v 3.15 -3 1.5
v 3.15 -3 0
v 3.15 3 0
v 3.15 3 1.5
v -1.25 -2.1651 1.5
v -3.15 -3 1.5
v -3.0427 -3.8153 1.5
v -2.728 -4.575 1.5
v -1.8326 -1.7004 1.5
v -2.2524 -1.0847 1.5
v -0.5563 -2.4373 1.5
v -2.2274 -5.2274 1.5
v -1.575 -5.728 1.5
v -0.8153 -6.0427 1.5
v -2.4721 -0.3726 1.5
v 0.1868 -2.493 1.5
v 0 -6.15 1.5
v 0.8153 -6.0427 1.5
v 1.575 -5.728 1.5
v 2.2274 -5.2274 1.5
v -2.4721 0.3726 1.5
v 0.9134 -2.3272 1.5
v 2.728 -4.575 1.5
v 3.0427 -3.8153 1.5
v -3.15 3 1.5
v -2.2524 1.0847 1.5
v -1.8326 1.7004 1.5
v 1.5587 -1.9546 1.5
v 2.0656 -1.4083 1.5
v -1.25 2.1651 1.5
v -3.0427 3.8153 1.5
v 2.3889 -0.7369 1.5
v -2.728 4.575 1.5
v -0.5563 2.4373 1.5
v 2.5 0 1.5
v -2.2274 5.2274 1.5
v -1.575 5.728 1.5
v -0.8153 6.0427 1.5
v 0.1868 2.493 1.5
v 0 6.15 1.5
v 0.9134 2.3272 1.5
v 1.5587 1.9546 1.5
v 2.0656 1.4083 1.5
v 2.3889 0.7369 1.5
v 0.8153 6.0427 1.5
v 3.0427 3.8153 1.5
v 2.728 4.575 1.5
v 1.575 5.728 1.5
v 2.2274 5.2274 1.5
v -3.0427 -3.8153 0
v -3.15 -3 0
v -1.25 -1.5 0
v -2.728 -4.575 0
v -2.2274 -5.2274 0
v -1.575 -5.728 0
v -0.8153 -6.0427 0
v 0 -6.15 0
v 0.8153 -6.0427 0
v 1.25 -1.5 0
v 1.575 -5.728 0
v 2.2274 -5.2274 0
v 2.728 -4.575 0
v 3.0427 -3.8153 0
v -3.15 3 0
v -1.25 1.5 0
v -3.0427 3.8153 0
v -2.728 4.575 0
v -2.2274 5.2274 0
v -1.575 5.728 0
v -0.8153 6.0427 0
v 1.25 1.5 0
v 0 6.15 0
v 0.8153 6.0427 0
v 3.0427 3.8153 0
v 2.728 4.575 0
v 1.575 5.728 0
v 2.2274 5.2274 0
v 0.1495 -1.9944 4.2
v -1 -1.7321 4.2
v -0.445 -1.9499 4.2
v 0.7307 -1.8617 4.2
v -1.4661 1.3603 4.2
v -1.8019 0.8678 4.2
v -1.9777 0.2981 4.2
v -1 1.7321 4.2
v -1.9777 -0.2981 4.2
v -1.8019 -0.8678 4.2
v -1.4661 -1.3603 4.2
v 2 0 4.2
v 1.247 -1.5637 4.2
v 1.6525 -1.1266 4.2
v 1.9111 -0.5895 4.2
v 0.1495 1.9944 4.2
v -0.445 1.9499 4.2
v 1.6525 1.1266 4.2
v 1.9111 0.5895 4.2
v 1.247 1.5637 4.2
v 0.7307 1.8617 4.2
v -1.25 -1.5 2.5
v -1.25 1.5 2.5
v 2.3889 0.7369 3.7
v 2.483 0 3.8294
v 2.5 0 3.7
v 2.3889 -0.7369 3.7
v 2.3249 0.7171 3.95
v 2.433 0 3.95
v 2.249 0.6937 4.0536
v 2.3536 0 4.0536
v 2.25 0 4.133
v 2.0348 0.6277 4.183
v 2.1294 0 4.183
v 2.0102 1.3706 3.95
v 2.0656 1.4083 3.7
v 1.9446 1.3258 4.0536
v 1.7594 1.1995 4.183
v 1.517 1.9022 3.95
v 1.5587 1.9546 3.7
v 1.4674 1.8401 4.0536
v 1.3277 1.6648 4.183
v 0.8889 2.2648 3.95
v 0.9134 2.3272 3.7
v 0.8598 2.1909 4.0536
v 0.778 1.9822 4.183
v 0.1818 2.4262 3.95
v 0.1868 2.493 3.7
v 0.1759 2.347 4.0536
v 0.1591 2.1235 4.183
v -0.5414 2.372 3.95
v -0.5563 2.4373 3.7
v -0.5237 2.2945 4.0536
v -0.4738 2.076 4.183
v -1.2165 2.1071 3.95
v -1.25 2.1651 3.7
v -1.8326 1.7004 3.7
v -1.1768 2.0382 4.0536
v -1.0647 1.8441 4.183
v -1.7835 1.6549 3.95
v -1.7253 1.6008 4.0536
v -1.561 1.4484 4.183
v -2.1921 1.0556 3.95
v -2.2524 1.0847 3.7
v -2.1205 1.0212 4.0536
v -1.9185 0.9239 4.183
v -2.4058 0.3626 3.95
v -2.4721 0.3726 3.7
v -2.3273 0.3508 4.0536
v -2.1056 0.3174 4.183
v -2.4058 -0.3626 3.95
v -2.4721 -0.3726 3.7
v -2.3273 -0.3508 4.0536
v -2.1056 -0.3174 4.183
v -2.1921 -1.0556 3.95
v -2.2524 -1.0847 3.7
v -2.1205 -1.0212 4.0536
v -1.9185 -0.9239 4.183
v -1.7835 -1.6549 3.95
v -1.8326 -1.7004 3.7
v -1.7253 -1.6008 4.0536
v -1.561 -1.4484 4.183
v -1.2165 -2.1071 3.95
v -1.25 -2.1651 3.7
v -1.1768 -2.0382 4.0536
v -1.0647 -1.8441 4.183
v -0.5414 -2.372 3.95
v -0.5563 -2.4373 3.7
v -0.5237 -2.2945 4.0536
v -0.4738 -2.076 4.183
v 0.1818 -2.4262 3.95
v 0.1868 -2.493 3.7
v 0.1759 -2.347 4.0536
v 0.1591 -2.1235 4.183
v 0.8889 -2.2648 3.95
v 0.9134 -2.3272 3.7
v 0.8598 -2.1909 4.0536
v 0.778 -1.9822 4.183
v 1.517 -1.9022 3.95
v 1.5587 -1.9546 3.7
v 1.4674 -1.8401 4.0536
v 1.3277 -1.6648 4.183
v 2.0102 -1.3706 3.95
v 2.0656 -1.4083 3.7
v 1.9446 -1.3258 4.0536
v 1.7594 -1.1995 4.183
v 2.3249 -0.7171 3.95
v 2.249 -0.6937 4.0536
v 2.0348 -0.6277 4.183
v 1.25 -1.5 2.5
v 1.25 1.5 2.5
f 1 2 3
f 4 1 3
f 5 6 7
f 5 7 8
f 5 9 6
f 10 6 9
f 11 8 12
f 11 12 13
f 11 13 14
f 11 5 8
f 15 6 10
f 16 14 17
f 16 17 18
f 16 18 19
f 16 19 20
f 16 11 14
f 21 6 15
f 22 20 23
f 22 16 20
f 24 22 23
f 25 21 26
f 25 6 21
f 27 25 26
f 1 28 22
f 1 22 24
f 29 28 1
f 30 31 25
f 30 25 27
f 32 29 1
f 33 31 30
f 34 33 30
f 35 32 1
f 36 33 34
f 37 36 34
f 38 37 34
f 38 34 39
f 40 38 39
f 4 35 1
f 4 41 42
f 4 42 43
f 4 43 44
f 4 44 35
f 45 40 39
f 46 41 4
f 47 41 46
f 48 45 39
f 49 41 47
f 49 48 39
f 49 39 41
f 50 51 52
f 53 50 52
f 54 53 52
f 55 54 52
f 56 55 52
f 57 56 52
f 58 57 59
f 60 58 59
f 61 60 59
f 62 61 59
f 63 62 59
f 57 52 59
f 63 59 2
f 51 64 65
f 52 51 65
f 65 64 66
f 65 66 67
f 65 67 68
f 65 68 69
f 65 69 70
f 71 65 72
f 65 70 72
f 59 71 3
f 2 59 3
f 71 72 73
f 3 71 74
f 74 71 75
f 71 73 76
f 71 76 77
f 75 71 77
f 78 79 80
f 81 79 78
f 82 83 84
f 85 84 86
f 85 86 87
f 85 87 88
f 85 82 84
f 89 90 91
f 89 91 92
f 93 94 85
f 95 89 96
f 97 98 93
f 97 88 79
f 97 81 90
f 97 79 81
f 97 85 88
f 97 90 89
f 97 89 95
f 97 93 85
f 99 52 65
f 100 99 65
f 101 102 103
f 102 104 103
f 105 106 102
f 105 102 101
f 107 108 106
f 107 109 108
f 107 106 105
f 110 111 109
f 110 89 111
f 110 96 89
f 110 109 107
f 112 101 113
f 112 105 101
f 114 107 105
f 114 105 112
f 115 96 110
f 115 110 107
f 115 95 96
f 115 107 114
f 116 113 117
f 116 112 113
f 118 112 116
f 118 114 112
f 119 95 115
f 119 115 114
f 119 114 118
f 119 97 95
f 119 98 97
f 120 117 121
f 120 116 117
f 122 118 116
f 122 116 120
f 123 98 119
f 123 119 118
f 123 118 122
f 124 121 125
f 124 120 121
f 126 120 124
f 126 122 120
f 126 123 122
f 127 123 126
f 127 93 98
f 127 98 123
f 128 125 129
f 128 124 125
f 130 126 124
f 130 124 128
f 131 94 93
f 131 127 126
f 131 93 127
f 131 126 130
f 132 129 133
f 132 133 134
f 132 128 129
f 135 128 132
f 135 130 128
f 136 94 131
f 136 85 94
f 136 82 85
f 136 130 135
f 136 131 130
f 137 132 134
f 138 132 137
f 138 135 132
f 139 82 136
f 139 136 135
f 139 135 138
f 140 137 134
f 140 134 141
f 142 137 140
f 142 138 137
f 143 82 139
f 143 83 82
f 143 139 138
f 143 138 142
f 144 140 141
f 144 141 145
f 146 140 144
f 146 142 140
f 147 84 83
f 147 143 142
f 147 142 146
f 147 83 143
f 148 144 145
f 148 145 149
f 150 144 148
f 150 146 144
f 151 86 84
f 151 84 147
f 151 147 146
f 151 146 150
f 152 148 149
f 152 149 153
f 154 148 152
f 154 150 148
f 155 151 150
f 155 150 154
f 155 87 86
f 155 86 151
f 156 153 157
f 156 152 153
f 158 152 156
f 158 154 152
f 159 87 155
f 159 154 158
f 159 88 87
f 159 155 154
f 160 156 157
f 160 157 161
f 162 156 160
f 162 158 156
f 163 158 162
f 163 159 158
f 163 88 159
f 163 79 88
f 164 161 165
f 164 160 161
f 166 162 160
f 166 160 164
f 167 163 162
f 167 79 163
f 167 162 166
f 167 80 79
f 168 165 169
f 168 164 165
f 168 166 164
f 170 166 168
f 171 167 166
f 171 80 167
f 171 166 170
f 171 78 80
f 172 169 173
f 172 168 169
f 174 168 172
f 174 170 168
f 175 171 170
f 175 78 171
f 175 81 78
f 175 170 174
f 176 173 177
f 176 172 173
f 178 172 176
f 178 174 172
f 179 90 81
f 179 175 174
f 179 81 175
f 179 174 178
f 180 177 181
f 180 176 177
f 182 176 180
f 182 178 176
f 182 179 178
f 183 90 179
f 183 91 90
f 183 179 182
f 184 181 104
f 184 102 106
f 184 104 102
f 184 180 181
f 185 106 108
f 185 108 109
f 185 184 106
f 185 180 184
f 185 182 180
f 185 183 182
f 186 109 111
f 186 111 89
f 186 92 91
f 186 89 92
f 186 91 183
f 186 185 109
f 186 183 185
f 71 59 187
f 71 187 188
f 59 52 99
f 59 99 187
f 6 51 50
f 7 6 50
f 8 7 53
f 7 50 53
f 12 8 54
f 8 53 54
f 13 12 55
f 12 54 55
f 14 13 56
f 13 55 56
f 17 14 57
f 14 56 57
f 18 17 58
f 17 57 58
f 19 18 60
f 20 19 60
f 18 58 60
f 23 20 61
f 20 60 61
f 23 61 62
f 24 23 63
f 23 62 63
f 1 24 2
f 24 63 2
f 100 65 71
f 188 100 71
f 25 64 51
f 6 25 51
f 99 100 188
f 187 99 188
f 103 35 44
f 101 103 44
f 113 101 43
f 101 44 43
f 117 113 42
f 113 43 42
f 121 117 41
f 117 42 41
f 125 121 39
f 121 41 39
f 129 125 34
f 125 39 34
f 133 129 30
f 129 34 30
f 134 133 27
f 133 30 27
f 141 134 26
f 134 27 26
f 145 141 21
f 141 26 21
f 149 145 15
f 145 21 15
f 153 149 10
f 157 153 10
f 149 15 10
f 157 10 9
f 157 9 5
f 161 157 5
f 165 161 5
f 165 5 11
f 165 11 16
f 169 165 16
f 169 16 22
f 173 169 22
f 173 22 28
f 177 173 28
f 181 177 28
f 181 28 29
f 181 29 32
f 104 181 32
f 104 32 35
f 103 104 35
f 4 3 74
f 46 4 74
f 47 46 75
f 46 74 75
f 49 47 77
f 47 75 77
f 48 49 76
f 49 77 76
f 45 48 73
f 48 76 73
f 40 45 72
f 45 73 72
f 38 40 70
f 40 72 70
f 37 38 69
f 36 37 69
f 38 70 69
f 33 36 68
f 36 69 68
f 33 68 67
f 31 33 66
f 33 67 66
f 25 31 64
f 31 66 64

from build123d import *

# Parameters (mm, degrees)
F0_R     = 2.5
F0_W     = 2.5
F0_H     = 3
F1_DEPTH = 1.5
F2_DEPTH = 4.2
F3_DEPTH = 2.5
F4_R     = 0.5


with BuildPart() as f1:
    # F0 (on Top) → F1 (new body)
    with BuildSketch(Plane.XY):
        with BuildLine():
            Line((-3.15, 3), (-3.15, -3))
            ThreePointArc((-3.15, -3), (0, -6.15), (3.15, -3))
            Line((3.15, -3), (3.15, 3))
            ThreePointArc((3.15, 3), (0, 6.15), (-3.15, 3))
        make_face()
        Circle(F0_R, mode=Mode.SUBTRACT)
        Circle(F0_R)
        Rectangle(F0_W, F0_H, mode=Mode.SUBTRACT)
        Rectangle(F0_W, F0_H)
    extrude(amount=F1_DEPTH)

    # F0 (on Top) → F2 (join)
    with BuildSketch(Plane.XY):
        Circle(F0_R)
        Rectangle(F0_W, F0_H, mode=Mode.SUBTRACT)
        Rectangle(F0_W, F0_H)
    extrude(amount=F2_DEPTH)

    # F0 (on Top) → F3 (cut)
    with BuildSketch(Plane.XY):
        Rectangle(F0_W, F0_H)
    extrude(amount=F3_DEPTH, mode=Mode.SUBTRACT)

    # F4
    f4_edges = [f1.edges().sort_by_distance(p)[0] for p in [
        (-2.5, 0, 4.2),
    ]]
    fillet(f4_edges, radius=F4_R)


solid = f1.part
